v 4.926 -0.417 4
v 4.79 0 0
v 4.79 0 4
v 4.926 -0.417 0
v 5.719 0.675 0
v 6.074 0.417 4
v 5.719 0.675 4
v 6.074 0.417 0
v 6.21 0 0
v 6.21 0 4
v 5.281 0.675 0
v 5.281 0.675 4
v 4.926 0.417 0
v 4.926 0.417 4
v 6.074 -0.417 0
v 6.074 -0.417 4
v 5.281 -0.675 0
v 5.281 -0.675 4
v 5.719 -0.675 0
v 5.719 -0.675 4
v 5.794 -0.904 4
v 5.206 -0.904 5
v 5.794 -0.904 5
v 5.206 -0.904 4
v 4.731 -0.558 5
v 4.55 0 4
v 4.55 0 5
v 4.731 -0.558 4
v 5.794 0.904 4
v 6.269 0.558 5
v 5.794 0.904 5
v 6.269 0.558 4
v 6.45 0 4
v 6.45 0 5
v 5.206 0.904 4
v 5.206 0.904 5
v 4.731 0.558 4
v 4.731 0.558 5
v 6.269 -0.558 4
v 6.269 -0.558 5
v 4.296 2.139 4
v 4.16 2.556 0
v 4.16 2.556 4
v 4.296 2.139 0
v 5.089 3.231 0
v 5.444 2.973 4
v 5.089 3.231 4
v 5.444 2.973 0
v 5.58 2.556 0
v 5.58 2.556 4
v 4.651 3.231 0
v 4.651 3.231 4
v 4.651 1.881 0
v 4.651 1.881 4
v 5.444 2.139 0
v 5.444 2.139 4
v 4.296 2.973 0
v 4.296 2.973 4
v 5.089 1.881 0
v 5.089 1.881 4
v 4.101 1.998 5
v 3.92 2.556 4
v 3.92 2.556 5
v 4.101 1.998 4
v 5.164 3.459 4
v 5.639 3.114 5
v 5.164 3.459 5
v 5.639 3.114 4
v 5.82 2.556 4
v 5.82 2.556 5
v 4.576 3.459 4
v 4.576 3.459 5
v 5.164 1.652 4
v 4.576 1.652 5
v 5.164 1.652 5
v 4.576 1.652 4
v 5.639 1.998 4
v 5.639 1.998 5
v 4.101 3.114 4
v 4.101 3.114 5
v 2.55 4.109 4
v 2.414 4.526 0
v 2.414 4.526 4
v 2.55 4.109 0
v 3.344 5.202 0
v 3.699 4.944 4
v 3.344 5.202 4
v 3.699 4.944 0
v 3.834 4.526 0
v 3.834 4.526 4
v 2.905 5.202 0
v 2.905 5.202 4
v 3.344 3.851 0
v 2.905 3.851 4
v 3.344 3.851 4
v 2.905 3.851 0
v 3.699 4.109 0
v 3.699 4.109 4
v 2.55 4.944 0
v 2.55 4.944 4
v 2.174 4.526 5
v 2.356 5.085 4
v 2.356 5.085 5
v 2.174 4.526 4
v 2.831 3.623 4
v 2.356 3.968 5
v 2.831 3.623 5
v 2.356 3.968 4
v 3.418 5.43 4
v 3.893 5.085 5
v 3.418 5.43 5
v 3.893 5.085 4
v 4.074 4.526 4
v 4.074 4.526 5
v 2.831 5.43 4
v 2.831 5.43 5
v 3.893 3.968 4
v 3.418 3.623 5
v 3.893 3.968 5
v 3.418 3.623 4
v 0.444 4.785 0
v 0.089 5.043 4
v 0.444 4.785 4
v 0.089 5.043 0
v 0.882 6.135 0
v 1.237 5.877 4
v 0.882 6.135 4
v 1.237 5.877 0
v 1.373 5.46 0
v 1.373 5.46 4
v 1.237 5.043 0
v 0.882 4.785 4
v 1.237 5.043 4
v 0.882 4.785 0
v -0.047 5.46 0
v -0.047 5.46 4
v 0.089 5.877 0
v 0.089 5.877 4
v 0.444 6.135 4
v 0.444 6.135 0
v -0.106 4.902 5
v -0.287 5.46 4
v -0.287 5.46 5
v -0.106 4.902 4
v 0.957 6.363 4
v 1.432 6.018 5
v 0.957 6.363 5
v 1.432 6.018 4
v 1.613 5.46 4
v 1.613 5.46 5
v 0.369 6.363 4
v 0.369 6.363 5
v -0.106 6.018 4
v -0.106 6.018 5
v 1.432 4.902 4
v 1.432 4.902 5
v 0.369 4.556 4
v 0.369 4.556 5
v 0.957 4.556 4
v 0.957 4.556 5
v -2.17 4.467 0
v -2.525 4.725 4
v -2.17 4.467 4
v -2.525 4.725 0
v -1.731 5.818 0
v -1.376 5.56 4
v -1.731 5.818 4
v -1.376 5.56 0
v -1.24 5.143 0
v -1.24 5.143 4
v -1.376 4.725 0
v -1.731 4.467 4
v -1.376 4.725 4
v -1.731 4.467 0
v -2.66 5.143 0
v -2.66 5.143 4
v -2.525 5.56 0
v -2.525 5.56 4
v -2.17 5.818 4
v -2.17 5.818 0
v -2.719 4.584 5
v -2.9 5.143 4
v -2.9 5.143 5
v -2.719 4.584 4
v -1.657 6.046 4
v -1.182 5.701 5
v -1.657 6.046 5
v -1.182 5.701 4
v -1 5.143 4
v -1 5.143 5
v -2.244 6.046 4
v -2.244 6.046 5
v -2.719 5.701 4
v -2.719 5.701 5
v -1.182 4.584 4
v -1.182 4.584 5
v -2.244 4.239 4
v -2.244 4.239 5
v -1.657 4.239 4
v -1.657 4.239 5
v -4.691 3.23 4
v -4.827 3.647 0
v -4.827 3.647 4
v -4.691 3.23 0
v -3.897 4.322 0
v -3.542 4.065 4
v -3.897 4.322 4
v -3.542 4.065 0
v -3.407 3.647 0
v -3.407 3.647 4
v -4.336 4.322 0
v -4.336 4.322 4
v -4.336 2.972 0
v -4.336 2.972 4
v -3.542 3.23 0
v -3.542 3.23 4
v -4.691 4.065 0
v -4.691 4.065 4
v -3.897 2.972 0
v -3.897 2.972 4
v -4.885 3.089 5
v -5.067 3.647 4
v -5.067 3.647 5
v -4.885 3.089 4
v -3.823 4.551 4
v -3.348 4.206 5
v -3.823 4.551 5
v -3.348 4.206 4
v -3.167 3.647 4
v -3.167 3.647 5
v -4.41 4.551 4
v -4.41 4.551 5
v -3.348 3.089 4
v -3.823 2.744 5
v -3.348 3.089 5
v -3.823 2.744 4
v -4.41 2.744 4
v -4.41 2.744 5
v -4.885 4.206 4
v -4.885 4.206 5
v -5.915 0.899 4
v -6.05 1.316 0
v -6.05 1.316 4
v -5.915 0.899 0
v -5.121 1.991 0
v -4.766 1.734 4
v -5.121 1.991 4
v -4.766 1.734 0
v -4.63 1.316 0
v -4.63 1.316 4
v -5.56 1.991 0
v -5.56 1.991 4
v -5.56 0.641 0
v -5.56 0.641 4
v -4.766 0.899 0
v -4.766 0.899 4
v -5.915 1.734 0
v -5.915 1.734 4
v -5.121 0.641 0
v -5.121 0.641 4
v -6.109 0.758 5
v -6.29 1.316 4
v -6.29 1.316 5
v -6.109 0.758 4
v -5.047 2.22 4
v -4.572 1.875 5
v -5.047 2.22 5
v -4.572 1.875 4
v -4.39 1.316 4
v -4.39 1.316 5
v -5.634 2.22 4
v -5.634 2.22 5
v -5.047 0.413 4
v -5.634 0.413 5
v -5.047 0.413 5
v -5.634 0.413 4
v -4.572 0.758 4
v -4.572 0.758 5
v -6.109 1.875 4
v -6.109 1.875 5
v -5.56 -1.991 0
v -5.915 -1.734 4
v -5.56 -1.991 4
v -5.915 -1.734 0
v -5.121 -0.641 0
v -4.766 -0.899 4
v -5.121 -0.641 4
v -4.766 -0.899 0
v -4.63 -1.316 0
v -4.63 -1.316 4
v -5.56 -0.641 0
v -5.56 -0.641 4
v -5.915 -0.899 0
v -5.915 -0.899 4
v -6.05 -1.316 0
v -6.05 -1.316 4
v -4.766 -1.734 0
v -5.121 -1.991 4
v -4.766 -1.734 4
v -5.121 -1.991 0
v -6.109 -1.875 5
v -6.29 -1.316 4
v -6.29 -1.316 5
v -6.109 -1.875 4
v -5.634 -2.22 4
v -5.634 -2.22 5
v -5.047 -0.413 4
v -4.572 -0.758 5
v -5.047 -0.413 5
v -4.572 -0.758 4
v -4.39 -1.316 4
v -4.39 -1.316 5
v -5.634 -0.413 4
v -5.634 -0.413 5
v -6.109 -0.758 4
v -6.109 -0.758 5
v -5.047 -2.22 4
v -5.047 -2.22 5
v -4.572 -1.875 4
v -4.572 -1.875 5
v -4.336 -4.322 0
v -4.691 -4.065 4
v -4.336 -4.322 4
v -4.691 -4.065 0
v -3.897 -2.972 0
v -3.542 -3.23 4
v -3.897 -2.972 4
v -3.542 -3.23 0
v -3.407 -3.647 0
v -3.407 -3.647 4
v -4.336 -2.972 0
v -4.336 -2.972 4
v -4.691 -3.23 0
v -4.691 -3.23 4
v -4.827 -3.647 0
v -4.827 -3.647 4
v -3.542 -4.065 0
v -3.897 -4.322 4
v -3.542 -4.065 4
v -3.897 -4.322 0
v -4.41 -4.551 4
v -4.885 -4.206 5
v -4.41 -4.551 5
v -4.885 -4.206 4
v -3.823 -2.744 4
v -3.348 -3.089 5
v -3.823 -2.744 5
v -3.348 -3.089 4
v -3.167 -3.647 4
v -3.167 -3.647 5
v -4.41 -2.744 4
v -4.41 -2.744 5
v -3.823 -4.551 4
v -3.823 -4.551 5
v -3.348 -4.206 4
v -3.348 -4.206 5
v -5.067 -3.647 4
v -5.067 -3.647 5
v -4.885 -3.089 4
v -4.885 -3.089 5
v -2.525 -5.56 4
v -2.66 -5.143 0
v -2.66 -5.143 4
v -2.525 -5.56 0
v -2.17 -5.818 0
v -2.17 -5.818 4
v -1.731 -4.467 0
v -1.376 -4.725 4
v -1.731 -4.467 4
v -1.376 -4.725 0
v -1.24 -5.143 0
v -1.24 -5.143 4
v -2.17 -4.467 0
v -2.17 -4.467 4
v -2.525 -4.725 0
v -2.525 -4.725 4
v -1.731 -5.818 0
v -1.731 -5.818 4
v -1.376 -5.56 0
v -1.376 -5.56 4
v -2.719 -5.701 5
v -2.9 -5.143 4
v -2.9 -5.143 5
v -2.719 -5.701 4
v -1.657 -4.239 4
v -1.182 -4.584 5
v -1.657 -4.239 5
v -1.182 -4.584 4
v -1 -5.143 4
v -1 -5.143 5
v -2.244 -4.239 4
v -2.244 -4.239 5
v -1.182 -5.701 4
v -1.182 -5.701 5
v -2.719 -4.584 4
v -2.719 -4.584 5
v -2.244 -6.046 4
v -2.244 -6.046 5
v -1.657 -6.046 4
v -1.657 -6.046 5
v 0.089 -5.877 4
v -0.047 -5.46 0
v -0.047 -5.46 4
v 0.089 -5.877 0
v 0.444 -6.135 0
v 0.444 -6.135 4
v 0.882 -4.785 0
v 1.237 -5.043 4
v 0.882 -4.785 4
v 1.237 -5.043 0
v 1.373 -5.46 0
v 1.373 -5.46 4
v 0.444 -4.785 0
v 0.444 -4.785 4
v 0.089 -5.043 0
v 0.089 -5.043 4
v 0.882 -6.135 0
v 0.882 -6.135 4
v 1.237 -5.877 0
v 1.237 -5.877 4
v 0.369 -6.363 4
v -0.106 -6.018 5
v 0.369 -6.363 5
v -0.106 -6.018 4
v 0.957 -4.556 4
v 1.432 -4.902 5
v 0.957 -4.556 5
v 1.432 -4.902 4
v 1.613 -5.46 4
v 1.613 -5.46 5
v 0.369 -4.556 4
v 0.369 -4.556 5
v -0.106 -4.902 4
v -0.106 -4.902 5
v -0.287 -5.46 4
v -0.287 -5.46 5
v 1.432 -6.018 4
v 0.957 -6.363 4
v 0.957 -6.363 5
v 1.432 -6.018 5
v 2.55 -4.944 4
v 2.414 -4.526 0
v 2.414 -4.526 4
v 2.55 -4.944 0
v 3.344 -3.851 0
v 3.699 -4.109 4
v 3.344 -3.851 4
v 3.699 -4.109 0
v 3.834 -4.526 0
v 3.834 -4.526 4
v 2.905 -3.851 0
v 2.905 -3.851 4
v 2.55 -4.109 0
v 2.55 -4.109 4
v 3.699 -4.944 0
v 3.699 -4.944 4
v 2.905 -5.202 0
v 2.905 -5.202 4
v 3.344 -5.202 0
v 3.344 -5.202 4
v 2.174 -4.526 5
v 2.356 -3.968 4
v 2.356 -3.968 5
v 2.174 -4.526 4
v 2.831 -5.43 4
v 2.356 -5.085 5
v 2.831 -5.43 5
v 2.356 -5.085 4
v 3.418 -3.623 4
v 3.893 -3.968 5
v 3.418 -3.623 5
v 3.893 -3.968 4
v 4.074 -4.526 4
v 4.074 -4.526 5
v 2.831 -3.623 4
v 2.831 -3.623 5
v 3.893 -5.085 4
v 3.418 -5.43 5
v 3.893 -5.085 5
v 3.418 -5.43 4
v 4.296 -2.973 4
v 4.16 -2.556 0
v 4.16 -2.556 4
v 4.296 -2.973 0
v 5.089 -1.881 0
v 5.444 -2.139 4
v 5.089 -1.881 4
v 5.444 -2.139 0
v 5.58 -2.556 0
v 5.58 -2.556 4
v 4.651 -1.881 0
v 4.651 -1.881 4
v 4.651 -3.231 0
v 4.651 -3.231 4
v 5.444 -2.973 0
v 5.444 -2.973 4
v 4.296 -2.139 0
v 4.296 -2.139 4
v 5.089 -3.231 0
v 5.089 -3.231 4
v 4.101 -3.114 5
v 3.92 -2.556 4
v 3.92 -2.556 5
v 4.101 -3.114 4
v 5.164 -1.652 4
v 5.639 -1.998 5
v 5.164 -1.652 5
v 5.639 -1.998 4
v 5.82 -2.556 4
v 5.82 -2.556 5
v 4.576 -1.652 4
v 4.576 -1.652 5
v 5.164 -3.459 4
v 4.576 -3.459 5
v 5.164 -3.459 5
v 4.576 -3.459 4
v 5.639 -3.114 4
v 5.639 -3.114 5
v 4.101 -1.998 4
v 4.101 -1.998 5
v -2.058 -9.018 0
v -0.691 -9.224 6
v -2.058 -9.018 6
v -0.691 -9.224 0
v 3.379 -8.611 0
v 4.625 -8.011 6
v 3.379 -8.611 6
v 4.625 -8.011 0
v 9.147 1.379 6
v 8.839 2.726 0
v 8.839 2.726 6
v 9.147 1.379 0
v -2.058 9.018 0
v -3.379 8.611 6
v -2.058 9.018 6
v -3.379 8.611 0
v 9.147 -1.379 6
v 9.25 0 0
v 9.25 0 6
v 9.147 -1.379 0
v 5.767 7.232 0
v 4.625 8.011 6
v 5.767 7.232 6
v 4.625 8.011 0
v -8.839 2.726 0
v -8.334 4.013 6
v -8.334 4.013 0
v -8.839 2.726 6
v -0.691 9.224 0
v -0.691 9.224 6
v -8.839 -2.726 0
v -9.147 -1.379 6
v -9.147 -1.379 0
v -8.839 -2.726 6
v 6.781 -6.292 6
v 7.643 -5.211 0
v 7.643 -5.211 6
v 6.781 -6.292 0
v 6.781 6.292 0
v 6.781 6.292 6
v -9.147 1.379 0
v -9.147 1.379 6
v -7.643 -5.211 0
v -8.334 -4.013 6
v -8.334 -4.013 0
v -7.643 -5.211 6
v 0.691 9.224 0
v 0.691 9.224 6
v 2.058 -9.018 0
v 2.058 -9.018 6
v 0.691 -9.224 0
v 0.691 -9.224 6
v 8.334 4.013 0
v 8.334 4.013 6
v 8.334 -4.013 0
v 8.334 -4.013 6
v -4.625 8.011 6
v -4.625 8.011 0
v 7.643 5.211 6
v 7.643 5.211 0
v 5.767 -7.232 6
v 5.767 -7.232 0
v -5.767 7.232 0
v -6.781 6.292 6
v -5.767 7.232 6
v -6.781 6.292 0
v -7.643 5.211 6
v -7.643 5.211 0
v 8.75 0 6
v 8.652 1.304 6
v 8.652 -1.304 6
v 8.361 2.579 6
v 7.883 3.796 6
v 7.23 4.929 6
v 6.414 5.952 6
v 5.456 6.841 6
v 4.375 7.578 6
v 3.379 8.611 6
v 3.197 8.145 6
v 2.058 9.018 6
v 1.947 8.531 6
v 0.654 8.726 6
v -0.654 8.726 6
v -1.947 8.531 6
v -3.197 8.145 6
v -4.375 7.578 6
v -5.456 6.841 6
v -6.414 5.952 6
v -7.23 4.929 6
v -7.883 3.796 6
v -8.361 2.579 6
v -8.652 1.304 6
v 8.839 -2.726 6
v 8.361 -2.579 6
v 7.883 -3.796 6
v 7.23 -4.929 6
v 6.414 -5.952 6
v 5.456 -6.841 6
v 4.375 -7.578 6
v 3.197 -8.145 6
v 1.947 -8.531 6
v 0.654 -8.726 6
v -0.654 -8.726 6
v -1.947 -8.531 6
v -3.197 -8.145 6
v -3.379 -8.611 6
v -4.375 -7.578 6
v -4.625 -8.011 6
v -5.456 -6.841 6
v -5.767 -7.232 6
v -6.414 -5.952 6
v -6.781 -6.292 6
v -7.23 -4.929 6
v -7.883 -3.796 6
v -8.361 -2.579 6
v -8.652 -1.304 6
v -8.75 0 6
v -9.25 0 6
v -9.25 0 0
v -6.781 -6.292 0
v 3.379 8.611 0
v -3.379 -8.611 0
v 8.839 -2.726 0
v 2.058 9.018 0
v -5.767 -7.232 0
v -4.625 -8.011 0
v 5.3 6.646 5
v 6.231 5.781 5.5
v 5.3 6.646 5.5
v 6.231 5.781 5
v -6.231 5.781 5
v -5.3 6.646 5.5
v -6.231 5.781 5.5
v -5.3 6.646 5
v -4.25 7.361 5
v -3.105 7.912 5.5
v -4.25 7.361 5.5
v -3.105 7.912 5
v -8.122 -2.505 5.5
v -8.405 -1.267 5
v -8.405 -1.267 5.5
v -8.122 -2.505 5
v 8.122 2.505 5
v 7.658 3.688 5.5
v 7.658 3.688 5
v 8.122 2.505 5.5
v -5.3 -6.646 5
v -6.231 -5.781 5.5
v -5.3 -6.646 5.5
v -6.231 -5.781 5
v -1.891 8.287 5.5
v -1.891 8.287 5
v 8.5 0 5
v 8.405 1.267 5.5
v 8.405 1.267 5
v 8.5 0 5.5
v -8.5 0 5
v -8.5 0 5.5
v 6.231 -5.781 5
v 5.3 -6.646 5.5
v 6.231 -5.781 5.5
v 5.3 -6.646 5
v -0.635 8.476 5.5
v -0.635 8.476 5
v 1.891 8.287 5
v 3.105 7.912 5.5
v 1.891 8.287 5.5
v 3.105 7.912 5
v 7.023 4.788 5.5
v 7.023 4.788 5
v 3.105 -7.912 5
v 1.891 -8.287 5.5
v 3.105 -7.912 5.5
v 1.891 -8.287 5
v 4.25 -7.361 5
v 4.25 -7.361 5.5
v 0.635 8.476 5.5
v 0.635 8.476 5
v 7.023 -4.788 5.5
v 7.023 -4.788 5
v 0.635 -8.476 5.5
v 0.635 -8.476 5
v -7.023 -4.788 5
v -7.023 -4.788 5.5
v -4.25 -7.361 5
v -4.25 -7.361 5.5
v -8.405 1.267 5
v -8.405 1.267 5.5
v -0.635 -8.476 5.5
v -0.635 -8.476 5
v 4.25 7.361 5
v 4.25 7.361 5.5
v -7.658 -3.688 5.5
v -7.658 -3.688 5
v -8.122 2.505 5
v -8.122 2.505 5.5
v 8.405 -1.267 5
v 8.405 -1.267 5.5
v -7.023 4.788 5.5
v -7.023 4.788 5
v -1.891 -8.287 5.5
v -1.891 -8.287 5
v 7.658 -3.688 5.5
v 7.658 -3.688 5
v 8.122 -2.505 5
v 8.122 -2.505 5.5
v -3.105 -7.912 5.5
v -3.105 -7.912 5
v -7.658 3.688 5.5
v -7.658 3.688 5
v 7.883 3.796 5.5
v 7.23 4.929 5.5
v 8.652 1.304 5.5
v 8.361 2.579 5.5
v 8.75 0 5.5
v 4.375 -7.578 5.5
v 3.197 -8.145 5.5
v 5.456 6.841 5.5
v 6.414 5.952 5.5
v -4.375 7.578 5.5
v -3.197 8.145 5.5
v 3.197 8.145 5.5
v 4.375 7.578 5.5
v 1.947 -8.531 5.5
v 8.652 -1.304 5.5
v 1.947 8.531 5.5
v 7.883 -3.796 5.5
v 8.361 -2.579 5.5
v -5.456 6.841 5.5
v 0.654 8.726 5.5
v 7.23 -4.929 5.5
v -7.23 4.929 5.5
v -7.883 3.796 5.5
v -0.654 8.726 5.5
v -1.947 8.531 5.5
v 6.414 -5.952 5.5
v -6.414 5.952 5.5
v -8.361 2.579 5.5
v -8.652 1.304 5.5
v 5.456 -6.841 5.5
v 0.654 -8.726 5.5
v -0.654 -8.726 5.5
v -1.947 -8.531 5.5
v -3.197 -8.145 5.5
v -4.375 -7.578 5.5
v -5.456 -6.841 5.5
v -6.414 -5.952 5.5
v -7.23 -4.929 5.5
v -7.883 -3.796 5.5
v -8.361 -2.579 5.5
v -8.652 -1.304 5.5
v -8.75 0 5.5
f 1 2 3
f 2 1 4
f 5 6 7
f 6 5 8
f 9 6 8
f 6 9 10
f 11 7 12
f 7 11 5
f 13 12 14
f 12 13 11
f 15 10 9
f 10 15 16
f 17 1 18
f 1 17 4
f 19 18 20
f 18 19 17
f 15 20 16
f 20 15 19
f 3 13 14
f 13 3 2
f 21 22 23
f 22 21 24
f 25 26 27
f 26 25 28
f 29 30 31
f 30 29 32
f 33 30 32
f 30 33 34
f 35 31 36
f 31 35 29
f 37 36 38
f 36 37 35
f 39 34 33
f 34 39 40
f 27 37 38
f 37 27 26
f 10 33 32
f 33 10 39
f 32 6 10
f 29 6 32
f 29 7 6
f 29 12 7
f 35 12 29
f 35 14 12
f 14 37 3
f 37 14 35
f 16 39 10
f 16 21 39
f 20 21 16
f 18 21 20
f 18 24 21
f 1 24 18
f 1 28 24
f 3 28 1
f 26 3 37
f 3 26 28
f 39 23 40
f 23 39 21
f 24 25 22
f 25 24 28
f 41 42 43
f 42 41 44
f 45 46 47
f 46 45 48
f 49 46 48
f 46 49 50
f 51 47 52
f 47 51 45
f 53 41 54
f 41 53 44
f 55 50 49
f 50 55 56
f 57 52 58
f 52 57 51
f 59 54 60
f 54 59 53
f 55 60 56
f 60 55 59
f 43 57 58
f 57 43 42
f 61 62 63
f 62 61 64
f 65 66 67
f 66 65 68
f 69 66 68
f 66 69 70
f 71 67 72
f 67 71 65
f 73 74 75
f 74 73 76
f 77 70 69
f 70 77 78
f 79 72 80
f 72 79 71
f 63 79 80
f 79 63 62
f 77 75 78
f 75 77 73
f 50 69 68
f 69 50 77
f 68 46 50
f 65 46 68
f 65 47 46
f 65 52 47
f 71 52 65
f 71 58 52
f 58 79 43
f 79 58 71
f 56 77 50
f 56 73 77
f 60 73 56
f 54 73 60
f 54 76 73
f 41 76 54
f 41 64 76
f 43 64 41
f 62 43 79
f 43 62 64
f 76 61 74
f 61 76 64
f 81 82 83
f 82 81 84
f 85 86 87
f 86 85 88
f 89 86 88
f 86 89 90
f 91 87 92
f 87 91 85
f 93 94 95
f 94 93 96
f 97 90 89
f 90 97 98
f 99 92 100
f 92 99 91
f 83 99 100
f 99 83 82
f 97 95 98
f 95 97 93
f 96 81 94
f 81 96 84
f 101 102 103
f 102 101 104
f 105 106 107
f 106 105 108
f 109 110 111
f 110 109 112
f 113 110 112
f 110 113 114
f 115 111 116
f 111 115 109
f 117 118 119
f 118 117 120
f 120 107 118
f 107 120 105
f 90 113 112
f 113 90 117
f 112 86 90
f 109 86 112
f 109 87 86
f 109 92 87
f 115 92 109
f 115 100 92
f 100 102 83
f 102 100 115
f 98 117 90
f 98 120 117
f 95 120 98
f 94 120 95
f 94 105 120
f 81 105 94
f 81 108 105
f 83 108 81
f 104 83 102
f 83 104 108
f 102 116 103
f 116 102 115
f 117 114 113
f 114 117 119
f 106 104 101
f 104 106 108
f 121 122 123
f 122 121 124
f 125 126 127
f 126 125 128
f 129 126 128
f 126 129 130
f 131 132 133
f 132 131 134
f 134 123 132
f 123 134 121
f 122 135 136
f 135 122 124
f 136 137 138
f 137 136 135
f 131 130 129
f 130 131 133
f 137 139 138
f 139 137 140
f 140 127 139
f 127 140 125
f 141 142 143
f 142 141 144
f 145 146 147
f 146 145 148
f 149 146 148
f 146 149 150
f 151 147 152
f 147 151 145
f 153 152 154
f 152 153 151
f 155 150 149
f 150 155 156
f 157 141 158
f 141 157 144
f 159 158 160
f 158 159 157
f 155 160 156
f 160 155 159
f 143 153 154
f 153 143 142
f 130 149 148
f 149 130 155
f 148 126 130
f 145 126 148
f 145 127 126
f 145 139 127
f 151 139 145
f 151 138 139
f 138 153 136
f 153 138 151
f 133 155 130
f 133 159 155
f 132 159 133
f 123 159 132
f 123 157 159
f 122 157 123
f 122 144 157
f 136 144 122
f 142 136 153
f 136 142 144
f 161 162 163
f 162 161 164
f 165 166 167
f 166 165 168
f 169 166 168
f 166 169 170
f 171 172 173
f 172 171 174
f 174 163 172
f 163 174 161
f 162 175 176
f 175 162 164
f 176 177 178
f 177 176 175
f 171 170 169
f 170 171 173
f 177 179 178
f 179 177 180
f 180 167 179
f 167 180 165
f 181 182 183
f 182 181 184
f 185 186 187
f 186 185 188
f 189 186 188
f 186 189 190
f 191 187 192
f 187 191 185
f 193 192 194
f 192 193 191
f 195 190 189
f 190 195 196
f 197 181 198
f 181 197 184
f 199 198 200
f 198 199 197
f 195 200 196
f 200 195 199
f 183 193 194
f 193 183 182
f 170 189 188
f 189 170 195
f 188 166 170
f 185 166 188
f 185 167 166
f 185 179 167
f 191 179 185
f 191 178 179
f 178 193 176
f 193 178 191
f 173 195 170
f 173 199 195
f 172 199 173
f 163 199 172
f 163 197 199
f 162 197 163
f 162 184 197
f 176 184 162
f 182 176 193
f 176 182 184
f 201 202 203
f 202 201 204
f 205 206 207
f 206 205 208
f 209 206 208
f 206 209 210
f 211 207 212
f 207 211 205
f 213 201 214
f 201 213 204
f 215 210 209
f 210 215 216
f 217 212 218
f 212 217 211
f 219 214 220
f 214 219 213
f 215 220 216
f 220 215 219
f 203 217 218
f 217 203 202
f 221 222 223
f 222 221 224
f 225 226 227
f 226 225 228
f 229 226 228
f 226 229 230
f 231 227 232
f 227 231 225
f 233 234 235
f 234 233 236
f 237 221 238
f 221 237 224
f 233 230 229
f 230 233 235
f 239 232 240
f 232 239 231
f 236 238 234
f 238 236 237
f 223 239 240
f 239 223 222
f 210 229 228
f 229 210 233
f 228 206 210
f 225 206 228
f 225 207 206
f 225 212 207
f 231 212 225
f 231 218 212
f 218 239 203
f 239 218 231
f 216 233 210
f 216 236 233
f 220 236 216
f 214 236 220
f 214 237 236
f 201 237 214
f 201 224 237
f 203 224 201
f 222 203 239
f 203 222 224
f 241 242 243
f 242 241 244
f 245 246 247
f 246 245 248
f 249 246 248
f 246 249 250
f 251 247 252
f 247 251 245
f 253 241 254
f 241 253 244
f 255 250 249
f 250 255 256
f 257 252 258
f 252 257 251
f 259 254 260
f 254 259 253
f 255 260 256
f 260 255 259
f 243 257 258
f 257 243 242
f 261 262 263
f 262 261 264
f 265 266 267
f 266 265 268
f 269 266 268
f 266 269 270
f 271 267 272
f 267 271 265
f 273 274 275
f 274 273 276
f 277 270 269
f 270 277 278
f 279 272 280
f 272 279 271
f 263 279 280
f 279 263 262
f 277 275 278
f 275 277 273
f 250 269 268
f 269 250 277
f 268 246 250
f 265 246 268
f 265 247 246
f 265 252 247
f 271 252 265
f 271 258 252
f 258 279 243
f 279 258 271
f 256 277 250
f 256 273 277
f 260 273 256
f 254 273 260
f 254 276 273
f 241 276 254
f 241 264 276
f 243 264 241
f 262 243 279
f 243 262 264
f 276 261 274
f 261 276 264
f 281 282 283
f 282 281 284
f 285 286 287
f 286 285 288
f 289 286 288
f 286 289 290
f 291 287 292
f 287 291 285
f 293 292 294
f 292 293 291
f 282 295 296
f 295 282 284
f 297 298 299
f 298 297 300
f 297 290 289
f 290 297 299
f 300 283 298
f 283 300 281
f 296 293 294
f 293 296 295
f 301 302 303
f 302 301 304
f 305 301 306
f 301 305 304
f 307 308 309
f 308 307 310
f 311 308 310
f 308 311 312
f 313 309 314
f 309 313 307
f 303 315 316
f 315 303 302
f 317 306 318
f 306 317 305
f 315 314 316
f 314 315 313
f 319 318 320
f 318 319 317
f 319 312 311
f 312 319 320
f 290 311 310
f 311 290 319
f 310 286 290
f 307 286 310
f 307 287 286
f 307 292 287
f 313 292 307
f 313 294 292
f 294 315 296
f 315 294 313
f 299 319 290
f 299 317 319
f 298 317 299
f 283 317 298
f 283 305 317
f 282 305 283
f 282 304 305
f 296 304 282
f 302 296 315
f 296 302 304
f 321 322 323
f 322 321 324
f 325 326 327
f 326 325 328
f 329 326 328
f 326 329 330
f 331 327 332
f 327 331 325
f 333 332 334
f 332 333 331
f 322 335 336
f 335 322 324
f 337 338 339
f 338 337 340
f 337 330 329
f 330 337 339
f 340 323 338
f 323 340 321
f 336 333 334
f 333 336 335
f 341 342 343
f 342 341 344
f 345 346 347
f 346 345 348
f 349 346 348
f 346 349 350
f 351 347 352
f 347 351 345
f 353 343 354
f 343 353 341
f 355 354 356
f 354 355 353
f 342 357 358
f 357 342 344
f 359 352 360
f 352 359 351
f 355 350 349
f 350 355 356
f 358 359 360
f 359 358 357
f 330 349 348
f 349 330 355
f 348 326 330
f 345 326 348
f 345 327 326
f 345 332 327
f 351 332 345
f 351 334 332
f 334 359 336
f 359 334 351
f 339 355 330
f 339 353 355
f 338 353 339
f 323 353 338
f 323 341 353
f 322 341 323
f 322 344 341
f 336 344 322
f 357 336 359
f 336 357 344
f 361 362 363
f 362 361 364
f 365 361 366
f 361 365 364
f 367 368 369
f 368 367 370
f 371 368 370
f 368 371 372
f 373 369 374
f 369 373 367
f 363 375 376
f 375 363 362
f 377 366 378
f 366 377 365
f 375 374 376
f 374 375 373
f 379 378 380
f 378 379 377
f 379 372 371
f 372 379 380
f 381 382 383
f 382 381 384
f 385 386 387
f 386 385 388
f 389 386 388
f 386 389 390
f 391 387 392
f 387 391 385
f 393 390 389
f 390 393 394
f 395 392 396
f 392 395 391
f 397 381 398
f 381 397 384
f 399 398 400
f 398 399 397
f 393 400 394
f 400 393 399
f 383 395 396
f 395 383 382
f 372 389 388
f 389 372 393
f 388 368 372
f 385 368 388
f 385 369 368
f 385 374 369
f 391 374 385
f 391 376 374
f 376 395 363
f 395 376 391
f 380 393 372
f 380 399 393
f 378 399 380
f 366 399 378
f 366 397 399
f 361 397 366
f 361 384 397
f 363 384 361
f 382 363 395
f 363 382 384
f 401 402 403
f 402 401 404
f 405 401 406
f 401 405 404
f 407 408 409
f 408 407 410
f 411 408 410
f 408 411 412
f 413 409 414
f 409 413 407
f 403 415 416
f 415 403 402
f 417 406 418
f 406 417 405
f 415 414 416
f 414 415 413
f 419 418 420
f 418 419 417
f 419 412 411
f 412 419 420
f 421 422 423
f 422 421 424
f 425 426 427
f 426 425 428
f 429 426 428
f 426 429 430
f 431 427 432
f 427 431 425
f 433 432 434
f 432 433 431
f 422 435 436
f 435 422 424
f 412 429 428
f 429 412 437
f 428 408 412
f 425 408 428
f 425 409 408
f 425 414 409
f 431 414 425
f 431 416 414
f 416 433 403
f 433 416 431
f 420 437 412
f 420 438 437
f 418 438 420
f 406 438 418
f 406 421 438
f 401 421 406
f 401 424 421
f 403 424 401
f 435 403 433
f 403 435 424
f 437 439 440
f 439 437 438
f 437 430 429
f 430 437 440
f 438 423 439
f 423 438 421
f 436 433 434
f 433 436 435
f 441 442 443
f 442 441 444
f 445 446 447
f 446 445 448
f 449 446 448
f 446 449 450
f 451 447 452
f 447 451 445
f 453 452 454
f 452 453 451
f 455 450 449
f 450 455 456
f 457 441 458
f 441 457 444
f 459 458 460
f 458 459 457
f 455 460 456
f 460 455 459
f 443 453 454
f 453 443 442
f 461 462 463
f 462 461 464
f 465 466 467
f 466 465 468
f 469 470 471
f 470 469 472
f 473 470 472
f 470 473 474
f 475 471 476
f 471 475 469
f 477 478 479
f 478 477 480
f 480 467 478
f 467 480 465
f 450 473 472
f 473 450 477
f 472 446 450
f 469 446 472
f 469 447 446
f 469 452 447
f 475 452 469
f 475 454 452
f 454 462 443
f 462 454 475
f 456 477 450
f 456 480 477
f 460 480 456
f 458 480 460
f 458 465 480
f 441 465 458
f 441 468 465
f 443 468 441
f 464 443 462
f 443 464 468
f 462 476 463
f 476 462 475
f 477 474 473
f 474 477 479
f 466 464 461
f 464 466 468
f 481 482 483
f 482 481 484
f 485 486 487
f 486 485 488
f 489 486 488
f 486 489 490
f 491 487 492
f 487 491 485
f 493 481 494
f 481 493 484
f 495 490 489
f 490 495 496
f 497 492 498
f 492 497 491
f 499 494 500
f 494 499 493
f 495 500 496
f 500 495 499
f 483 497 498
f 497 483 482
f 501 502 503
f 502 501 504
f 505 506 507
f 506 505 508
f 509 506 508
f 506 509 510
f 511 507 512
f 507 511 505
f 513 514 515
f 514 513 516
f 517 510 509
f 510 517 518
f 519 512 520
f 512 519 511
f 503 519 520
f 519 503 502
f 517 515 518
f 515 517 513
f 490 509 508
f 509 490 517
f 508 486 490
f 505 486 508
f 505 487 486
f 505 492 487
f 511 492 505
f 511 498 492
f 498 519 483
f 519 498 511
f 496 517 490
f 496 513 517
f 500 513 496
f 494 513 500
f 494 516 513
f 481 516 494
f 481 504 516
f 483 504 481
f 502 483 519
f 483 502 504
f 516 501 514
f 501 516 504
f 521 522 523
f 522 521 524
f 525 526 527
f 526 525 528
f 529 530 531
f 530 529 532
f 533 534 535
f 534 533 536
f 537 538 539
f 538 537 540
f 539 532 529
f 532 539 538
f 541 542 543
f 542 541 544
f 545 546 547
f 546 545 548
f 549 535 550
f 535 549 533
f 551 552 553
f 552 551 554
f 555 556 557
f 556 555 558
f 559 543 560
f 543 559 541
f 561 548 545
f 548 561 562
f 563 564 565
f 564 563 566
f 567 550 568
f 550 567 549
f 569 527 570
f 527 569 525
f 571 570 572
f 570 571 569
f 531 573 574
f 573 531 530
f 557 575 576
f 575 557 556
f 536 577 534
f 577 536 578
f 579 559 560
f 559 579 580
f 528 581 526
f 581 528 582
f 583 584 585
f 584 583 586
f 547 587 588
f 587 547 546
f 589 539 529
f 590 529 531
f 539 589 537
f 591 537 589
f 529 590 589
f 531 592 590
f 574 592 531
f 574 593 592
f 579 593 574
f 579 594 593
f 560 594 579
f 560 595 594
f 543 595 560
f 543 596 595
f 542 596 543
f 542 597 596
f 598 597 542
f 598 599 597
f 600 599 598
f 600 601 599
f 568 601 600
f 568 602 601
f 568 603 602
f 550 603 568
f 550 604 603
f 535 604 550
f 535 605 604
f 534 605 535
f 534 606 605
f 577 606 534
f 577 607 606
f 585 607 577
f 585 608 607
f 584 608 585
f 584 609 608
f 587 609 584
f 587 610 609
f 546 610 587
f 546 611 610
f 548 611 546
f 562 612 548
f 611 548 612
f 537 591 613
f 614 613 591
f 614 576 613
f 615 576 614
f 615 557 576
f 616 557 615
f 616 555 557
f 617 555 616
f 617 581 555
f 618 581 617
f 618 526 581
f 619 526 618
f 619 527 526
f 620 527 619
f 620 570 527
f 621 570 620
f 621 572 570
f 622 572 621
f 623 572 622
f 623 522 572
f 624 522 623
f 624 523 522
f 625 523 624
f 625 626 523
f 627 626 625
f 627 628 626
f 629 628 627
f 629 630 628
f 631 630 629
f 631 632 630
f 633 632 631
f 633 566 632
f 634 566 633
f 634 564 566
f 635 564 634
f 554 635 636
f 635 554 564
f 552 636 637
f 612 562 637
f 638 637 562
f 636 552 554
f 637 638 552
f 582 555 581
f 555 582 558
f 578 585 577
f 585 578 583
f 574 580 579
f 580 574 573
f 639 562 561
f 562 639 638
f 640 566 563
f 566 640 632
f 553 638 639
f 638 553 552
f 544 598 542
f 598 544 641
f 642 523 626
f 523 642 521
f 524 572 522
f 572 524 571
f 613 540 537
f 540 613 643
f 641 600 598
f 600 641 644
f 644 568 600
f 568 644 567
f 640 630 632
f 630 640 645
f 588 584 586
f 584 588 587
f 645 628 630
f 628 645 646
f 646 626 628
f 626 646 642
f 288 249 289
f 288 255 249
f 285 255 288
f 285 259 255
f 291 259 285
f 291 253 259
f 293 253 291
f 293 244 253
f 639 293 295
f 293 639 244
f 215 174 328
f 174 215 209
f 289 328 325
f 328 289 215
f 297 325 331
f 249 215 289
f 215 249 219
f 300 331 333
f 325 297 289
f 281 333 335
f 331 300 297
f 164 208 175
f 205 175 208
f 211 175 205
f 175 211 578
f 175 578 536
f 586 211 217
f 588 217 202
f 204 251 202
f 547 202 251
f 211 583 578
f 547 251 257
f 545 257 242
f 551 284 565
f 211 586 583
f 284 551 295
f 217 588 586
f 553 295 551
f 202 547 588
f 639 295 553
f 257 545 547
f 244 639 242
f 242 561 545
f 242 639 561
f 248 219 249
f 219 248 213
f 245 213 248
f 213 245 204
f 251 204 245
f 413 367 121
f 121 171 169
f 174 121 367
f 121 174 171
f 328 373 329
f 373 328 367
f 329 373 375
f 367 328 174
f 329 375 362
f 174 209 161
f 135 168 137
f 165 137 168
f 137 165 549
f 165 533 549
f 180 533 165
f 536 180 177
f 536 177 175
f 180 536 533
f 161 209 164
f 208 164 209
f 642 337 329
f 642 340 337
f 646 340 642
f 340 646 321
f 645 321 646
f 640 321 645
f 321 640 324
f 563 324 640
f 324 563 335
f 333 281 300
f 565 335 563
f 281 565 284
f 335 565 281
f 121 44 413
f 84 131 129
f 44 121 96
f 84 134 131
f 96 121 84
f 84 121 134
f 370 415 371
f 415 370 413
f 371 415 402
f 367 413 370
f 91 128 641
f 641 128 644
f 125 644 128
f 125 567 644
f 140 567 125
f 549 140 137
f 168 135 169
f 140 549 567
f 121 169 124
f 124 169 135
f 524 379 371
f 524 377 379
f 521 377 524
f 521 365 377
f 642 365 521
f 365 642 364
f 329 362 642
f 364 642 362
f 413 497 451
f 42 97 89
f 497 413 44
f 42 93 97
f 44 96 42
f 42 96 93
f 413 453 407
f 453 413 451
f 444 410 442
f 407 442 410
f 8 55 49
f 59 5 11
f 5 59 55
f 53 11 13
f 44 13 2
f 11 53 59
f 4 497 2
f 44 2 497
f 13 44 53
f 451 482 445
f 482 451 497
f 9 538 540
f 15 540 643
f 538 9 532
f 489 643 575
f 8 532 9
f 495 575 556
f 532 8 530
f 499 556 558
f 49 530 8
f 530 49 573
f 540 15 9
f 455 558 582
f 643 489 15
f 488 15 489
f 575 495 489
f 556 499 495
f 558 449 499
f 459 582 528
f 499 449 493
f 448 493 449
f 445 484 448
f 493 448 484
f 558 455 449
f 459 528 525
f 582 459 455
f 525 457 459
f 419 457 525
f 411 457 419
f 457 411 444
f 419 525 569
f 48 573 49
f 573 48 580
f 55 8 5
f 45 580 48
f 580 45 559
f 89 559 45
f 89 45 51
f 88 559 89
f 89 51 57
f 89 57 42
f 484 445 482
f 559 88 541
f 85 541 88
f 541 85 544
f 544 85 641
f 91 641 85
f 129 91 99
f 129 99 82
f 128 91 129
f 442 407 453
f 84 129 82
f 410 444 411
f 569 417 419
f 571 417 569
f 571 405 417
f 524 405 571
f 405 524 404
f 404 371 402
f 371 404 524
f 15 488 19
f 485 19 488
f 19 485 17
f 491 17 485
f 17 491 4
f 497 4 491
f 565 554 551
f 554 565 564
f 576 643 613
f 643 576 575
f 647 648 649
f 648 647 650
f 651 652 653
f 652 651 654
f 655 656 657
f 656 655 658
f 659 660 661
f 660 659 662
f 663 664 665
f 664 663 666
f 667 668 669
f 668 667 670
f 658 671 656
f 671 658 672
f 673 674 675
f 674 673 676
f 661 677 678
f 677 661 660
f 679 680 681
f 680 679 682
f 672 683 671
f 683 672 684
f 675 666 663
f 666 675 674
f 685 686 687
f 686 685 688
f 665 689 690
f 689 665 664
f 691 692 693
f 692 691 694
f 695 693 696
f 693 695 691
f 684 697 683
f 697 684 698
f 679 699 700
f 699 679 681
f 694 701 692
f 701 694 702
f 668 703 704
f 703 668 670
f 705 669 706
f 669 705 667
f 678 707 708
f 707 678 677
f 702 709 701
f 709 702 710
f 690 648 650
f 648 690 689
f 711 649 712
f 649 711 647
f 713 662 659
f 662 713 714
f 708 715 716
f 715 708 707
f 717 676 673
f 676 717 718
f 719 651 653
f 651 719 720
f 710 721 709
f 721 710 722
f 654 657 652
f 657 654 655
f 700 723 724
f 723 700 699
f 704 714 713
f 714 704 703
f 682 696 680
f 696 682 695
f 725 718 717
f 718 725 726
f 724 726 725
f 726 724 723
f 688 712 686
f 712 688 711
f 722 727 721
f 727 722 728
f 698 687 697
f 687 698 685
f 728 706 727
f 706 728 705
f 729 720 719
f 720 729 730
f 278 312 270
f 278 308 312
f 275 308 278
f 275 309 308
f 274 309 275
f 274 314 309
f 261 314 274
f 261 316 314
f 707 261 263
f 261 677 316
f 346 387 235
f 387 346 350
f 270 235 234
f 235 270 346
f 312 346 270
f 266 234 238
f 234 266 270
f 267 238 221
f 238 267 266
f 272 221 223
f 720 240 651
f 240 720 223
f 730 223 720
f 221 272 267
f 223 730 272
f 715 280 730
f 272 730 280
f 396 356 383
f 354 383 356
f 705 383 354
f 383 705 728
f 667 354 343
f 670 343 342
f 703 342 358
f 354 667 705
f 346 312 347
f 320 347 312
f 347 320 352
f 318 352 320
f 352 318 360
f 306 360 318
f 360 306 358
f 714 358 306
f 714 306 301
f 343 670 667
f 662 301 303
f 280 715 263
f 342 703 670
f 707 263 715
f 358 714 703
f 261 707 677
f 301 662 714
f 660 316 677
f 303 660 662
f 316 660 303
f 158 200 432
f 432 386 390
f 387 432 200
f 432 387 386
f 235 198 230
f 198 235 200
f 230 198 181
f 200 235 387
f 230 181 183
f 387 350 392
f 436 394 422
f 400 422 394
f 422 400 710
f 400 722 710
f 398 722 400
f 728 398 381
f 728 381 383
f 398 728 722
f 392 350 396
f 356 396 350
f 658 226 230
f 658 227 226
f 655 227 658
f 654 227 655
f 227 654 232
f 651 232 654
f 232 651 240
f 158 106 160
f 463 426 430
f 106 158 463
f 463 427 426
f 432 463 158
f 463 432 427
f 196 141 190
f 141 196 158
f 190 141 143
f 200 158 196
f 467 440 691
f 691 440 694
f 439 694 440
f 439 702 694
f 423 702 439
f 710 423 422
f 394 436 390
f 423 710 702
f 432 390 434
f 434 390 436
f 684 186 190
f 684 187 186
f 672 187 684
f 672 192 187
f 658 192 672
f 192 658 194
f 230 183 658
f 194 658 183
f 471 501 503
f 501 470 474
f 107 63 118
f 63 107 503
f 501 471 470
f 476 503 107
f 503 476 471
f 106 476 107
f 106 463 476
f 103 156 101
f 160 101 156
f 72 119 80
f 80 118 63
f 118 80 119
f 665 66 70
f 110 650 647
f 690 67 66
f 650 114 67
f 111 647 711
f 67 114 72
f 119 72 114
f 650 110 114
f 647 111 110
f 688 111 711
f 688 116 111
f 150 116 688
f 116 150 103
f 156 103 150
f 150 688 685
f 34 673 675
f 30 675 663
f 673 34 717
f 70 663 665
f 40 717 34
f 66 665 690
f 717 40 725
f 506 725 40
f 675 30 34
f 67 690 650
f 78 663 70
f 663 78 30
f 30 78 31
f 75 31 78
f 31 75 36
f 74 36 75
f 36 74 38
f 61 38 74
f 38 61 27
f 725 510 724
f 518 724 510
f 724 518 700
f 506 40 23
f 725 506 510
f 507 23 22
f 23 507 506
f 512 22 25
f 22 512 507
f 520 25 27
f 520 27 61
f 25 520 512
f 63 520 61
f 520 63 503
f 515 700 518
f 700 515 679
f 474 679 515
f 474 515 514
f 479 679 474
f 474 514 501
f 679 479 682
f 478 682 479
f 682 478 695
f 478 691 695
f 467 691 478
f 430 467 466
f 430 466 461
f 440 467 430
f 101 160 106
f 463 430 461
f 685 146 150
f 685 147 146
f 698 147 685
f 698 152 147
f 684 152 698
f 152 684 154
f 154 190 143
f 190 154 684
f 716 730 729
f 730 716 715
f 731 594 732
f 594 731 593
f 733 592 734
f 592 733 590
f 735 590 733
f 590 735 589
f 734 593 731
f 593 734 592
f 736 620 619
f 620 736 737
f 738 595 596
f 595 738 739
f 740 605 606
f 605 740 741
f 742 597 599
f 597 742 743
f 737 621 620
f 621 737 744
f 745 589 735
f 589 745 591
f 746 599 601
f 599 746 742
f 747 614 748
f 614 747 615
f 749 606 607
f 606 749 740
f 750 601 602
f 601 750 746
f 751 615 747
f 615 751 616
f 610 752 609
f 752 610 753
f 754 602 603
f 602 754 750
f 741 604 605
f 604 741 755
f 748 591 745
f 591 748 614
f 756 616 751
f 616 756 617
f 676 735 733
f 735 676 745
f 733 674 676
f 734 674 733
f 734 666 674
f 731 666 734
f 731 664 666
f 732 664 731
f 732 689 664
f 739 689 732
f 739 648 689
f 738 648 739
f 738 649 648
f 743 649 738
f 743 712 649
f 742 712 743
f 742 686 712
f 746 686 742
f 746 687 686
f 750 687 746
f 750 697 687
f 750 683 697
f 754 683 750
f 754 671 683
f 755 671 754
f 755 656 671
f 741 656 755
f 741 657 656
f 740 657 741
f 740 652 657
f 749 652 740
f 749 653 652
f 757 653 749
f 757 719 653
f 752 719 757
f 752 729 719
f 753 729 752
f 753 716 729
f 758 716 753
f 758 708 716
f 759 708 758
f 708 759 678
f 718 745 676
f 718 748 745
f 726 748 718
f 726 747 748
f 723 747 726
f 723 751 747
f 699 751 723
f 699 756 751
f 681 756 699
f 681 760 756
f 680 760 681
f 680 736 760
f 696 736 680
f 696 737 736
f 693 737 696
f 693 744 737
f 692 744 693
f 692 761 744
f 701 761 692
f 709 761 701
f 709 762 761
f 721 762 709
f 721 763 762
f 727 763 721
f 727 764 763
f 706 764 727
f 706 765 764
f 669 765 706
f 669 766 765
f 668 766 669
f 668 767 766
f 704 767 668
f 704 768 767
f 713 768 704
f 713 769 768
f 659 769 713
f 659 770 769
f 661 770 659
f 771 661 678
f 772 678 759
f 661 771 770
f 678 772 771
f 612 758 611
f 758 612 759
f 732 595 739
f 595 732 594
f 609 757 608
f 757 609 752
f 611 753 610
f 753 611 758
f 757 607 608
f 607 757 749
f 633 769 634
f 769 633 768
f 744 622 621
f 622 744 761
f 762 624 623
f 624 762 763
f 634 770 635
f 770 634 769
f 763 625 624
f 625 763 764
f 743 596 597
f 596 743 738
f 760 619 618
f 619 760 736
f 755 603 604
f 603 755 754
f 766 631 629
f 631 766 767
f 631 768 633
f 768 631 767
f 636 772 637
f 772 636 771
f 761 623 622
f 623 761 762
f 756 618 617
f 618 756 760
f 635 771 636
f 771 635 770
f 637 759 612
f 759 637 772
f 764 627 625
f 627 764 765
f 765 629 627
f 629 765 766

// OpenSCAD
// file: nixie.scad
//
// This model is licensed under a
// Creative Commons Attribution-ShareAlike 4.0 International License.
// 
// You should have received a copy of the license along with this
// work. If not, see <http://creativecommons.org/licenses/by-sa/4.0/>.
//

in14spacer();

// IN-14 nixie tube spacer. Compatible with machined DIP or wire wrap
// terminals to make a nixie tube socket.
//
// height - spacer height between board and tube
// lip    - height of lip around edge

module in14spacer(height = 5, lip = 1) {
    pr1 = 1.9/2;  // 1.83 with wiggle room
    pr2 = 1.42/2; // 1.35 with wiggle room
    $fn = 42;

    difference() {
        color("grey") cylinder(h = height+lip, r = 9.25);
        
        // carve out the lip
        translate([0,0,height]) cylinder(h = lip/2+0.1, r = 8.5);
        translate([0,0,height+lip/2]) cylinder(h = lip+0.1, r = 8.75);
        
        for (i = [0:13]) {
            $fn = 10;
            cx = 5.5 * cos(360/13 * i);
            cy = 5.5 * sin(360/13 * i);

            color("green") translate([cx, cy, -1]) cylinder(h = height+2, r = pr2);
            color("purple") translate([cx, cy, height-1]) cylinder(h = 1.1, r = pr1);
        }
    }
}
// main file
include <nixie.scad>

difference() {
    in14spacer ();

    $fn=3;
    translate([0,0,-1]) cylinder(h=8, r=2.5);
}
